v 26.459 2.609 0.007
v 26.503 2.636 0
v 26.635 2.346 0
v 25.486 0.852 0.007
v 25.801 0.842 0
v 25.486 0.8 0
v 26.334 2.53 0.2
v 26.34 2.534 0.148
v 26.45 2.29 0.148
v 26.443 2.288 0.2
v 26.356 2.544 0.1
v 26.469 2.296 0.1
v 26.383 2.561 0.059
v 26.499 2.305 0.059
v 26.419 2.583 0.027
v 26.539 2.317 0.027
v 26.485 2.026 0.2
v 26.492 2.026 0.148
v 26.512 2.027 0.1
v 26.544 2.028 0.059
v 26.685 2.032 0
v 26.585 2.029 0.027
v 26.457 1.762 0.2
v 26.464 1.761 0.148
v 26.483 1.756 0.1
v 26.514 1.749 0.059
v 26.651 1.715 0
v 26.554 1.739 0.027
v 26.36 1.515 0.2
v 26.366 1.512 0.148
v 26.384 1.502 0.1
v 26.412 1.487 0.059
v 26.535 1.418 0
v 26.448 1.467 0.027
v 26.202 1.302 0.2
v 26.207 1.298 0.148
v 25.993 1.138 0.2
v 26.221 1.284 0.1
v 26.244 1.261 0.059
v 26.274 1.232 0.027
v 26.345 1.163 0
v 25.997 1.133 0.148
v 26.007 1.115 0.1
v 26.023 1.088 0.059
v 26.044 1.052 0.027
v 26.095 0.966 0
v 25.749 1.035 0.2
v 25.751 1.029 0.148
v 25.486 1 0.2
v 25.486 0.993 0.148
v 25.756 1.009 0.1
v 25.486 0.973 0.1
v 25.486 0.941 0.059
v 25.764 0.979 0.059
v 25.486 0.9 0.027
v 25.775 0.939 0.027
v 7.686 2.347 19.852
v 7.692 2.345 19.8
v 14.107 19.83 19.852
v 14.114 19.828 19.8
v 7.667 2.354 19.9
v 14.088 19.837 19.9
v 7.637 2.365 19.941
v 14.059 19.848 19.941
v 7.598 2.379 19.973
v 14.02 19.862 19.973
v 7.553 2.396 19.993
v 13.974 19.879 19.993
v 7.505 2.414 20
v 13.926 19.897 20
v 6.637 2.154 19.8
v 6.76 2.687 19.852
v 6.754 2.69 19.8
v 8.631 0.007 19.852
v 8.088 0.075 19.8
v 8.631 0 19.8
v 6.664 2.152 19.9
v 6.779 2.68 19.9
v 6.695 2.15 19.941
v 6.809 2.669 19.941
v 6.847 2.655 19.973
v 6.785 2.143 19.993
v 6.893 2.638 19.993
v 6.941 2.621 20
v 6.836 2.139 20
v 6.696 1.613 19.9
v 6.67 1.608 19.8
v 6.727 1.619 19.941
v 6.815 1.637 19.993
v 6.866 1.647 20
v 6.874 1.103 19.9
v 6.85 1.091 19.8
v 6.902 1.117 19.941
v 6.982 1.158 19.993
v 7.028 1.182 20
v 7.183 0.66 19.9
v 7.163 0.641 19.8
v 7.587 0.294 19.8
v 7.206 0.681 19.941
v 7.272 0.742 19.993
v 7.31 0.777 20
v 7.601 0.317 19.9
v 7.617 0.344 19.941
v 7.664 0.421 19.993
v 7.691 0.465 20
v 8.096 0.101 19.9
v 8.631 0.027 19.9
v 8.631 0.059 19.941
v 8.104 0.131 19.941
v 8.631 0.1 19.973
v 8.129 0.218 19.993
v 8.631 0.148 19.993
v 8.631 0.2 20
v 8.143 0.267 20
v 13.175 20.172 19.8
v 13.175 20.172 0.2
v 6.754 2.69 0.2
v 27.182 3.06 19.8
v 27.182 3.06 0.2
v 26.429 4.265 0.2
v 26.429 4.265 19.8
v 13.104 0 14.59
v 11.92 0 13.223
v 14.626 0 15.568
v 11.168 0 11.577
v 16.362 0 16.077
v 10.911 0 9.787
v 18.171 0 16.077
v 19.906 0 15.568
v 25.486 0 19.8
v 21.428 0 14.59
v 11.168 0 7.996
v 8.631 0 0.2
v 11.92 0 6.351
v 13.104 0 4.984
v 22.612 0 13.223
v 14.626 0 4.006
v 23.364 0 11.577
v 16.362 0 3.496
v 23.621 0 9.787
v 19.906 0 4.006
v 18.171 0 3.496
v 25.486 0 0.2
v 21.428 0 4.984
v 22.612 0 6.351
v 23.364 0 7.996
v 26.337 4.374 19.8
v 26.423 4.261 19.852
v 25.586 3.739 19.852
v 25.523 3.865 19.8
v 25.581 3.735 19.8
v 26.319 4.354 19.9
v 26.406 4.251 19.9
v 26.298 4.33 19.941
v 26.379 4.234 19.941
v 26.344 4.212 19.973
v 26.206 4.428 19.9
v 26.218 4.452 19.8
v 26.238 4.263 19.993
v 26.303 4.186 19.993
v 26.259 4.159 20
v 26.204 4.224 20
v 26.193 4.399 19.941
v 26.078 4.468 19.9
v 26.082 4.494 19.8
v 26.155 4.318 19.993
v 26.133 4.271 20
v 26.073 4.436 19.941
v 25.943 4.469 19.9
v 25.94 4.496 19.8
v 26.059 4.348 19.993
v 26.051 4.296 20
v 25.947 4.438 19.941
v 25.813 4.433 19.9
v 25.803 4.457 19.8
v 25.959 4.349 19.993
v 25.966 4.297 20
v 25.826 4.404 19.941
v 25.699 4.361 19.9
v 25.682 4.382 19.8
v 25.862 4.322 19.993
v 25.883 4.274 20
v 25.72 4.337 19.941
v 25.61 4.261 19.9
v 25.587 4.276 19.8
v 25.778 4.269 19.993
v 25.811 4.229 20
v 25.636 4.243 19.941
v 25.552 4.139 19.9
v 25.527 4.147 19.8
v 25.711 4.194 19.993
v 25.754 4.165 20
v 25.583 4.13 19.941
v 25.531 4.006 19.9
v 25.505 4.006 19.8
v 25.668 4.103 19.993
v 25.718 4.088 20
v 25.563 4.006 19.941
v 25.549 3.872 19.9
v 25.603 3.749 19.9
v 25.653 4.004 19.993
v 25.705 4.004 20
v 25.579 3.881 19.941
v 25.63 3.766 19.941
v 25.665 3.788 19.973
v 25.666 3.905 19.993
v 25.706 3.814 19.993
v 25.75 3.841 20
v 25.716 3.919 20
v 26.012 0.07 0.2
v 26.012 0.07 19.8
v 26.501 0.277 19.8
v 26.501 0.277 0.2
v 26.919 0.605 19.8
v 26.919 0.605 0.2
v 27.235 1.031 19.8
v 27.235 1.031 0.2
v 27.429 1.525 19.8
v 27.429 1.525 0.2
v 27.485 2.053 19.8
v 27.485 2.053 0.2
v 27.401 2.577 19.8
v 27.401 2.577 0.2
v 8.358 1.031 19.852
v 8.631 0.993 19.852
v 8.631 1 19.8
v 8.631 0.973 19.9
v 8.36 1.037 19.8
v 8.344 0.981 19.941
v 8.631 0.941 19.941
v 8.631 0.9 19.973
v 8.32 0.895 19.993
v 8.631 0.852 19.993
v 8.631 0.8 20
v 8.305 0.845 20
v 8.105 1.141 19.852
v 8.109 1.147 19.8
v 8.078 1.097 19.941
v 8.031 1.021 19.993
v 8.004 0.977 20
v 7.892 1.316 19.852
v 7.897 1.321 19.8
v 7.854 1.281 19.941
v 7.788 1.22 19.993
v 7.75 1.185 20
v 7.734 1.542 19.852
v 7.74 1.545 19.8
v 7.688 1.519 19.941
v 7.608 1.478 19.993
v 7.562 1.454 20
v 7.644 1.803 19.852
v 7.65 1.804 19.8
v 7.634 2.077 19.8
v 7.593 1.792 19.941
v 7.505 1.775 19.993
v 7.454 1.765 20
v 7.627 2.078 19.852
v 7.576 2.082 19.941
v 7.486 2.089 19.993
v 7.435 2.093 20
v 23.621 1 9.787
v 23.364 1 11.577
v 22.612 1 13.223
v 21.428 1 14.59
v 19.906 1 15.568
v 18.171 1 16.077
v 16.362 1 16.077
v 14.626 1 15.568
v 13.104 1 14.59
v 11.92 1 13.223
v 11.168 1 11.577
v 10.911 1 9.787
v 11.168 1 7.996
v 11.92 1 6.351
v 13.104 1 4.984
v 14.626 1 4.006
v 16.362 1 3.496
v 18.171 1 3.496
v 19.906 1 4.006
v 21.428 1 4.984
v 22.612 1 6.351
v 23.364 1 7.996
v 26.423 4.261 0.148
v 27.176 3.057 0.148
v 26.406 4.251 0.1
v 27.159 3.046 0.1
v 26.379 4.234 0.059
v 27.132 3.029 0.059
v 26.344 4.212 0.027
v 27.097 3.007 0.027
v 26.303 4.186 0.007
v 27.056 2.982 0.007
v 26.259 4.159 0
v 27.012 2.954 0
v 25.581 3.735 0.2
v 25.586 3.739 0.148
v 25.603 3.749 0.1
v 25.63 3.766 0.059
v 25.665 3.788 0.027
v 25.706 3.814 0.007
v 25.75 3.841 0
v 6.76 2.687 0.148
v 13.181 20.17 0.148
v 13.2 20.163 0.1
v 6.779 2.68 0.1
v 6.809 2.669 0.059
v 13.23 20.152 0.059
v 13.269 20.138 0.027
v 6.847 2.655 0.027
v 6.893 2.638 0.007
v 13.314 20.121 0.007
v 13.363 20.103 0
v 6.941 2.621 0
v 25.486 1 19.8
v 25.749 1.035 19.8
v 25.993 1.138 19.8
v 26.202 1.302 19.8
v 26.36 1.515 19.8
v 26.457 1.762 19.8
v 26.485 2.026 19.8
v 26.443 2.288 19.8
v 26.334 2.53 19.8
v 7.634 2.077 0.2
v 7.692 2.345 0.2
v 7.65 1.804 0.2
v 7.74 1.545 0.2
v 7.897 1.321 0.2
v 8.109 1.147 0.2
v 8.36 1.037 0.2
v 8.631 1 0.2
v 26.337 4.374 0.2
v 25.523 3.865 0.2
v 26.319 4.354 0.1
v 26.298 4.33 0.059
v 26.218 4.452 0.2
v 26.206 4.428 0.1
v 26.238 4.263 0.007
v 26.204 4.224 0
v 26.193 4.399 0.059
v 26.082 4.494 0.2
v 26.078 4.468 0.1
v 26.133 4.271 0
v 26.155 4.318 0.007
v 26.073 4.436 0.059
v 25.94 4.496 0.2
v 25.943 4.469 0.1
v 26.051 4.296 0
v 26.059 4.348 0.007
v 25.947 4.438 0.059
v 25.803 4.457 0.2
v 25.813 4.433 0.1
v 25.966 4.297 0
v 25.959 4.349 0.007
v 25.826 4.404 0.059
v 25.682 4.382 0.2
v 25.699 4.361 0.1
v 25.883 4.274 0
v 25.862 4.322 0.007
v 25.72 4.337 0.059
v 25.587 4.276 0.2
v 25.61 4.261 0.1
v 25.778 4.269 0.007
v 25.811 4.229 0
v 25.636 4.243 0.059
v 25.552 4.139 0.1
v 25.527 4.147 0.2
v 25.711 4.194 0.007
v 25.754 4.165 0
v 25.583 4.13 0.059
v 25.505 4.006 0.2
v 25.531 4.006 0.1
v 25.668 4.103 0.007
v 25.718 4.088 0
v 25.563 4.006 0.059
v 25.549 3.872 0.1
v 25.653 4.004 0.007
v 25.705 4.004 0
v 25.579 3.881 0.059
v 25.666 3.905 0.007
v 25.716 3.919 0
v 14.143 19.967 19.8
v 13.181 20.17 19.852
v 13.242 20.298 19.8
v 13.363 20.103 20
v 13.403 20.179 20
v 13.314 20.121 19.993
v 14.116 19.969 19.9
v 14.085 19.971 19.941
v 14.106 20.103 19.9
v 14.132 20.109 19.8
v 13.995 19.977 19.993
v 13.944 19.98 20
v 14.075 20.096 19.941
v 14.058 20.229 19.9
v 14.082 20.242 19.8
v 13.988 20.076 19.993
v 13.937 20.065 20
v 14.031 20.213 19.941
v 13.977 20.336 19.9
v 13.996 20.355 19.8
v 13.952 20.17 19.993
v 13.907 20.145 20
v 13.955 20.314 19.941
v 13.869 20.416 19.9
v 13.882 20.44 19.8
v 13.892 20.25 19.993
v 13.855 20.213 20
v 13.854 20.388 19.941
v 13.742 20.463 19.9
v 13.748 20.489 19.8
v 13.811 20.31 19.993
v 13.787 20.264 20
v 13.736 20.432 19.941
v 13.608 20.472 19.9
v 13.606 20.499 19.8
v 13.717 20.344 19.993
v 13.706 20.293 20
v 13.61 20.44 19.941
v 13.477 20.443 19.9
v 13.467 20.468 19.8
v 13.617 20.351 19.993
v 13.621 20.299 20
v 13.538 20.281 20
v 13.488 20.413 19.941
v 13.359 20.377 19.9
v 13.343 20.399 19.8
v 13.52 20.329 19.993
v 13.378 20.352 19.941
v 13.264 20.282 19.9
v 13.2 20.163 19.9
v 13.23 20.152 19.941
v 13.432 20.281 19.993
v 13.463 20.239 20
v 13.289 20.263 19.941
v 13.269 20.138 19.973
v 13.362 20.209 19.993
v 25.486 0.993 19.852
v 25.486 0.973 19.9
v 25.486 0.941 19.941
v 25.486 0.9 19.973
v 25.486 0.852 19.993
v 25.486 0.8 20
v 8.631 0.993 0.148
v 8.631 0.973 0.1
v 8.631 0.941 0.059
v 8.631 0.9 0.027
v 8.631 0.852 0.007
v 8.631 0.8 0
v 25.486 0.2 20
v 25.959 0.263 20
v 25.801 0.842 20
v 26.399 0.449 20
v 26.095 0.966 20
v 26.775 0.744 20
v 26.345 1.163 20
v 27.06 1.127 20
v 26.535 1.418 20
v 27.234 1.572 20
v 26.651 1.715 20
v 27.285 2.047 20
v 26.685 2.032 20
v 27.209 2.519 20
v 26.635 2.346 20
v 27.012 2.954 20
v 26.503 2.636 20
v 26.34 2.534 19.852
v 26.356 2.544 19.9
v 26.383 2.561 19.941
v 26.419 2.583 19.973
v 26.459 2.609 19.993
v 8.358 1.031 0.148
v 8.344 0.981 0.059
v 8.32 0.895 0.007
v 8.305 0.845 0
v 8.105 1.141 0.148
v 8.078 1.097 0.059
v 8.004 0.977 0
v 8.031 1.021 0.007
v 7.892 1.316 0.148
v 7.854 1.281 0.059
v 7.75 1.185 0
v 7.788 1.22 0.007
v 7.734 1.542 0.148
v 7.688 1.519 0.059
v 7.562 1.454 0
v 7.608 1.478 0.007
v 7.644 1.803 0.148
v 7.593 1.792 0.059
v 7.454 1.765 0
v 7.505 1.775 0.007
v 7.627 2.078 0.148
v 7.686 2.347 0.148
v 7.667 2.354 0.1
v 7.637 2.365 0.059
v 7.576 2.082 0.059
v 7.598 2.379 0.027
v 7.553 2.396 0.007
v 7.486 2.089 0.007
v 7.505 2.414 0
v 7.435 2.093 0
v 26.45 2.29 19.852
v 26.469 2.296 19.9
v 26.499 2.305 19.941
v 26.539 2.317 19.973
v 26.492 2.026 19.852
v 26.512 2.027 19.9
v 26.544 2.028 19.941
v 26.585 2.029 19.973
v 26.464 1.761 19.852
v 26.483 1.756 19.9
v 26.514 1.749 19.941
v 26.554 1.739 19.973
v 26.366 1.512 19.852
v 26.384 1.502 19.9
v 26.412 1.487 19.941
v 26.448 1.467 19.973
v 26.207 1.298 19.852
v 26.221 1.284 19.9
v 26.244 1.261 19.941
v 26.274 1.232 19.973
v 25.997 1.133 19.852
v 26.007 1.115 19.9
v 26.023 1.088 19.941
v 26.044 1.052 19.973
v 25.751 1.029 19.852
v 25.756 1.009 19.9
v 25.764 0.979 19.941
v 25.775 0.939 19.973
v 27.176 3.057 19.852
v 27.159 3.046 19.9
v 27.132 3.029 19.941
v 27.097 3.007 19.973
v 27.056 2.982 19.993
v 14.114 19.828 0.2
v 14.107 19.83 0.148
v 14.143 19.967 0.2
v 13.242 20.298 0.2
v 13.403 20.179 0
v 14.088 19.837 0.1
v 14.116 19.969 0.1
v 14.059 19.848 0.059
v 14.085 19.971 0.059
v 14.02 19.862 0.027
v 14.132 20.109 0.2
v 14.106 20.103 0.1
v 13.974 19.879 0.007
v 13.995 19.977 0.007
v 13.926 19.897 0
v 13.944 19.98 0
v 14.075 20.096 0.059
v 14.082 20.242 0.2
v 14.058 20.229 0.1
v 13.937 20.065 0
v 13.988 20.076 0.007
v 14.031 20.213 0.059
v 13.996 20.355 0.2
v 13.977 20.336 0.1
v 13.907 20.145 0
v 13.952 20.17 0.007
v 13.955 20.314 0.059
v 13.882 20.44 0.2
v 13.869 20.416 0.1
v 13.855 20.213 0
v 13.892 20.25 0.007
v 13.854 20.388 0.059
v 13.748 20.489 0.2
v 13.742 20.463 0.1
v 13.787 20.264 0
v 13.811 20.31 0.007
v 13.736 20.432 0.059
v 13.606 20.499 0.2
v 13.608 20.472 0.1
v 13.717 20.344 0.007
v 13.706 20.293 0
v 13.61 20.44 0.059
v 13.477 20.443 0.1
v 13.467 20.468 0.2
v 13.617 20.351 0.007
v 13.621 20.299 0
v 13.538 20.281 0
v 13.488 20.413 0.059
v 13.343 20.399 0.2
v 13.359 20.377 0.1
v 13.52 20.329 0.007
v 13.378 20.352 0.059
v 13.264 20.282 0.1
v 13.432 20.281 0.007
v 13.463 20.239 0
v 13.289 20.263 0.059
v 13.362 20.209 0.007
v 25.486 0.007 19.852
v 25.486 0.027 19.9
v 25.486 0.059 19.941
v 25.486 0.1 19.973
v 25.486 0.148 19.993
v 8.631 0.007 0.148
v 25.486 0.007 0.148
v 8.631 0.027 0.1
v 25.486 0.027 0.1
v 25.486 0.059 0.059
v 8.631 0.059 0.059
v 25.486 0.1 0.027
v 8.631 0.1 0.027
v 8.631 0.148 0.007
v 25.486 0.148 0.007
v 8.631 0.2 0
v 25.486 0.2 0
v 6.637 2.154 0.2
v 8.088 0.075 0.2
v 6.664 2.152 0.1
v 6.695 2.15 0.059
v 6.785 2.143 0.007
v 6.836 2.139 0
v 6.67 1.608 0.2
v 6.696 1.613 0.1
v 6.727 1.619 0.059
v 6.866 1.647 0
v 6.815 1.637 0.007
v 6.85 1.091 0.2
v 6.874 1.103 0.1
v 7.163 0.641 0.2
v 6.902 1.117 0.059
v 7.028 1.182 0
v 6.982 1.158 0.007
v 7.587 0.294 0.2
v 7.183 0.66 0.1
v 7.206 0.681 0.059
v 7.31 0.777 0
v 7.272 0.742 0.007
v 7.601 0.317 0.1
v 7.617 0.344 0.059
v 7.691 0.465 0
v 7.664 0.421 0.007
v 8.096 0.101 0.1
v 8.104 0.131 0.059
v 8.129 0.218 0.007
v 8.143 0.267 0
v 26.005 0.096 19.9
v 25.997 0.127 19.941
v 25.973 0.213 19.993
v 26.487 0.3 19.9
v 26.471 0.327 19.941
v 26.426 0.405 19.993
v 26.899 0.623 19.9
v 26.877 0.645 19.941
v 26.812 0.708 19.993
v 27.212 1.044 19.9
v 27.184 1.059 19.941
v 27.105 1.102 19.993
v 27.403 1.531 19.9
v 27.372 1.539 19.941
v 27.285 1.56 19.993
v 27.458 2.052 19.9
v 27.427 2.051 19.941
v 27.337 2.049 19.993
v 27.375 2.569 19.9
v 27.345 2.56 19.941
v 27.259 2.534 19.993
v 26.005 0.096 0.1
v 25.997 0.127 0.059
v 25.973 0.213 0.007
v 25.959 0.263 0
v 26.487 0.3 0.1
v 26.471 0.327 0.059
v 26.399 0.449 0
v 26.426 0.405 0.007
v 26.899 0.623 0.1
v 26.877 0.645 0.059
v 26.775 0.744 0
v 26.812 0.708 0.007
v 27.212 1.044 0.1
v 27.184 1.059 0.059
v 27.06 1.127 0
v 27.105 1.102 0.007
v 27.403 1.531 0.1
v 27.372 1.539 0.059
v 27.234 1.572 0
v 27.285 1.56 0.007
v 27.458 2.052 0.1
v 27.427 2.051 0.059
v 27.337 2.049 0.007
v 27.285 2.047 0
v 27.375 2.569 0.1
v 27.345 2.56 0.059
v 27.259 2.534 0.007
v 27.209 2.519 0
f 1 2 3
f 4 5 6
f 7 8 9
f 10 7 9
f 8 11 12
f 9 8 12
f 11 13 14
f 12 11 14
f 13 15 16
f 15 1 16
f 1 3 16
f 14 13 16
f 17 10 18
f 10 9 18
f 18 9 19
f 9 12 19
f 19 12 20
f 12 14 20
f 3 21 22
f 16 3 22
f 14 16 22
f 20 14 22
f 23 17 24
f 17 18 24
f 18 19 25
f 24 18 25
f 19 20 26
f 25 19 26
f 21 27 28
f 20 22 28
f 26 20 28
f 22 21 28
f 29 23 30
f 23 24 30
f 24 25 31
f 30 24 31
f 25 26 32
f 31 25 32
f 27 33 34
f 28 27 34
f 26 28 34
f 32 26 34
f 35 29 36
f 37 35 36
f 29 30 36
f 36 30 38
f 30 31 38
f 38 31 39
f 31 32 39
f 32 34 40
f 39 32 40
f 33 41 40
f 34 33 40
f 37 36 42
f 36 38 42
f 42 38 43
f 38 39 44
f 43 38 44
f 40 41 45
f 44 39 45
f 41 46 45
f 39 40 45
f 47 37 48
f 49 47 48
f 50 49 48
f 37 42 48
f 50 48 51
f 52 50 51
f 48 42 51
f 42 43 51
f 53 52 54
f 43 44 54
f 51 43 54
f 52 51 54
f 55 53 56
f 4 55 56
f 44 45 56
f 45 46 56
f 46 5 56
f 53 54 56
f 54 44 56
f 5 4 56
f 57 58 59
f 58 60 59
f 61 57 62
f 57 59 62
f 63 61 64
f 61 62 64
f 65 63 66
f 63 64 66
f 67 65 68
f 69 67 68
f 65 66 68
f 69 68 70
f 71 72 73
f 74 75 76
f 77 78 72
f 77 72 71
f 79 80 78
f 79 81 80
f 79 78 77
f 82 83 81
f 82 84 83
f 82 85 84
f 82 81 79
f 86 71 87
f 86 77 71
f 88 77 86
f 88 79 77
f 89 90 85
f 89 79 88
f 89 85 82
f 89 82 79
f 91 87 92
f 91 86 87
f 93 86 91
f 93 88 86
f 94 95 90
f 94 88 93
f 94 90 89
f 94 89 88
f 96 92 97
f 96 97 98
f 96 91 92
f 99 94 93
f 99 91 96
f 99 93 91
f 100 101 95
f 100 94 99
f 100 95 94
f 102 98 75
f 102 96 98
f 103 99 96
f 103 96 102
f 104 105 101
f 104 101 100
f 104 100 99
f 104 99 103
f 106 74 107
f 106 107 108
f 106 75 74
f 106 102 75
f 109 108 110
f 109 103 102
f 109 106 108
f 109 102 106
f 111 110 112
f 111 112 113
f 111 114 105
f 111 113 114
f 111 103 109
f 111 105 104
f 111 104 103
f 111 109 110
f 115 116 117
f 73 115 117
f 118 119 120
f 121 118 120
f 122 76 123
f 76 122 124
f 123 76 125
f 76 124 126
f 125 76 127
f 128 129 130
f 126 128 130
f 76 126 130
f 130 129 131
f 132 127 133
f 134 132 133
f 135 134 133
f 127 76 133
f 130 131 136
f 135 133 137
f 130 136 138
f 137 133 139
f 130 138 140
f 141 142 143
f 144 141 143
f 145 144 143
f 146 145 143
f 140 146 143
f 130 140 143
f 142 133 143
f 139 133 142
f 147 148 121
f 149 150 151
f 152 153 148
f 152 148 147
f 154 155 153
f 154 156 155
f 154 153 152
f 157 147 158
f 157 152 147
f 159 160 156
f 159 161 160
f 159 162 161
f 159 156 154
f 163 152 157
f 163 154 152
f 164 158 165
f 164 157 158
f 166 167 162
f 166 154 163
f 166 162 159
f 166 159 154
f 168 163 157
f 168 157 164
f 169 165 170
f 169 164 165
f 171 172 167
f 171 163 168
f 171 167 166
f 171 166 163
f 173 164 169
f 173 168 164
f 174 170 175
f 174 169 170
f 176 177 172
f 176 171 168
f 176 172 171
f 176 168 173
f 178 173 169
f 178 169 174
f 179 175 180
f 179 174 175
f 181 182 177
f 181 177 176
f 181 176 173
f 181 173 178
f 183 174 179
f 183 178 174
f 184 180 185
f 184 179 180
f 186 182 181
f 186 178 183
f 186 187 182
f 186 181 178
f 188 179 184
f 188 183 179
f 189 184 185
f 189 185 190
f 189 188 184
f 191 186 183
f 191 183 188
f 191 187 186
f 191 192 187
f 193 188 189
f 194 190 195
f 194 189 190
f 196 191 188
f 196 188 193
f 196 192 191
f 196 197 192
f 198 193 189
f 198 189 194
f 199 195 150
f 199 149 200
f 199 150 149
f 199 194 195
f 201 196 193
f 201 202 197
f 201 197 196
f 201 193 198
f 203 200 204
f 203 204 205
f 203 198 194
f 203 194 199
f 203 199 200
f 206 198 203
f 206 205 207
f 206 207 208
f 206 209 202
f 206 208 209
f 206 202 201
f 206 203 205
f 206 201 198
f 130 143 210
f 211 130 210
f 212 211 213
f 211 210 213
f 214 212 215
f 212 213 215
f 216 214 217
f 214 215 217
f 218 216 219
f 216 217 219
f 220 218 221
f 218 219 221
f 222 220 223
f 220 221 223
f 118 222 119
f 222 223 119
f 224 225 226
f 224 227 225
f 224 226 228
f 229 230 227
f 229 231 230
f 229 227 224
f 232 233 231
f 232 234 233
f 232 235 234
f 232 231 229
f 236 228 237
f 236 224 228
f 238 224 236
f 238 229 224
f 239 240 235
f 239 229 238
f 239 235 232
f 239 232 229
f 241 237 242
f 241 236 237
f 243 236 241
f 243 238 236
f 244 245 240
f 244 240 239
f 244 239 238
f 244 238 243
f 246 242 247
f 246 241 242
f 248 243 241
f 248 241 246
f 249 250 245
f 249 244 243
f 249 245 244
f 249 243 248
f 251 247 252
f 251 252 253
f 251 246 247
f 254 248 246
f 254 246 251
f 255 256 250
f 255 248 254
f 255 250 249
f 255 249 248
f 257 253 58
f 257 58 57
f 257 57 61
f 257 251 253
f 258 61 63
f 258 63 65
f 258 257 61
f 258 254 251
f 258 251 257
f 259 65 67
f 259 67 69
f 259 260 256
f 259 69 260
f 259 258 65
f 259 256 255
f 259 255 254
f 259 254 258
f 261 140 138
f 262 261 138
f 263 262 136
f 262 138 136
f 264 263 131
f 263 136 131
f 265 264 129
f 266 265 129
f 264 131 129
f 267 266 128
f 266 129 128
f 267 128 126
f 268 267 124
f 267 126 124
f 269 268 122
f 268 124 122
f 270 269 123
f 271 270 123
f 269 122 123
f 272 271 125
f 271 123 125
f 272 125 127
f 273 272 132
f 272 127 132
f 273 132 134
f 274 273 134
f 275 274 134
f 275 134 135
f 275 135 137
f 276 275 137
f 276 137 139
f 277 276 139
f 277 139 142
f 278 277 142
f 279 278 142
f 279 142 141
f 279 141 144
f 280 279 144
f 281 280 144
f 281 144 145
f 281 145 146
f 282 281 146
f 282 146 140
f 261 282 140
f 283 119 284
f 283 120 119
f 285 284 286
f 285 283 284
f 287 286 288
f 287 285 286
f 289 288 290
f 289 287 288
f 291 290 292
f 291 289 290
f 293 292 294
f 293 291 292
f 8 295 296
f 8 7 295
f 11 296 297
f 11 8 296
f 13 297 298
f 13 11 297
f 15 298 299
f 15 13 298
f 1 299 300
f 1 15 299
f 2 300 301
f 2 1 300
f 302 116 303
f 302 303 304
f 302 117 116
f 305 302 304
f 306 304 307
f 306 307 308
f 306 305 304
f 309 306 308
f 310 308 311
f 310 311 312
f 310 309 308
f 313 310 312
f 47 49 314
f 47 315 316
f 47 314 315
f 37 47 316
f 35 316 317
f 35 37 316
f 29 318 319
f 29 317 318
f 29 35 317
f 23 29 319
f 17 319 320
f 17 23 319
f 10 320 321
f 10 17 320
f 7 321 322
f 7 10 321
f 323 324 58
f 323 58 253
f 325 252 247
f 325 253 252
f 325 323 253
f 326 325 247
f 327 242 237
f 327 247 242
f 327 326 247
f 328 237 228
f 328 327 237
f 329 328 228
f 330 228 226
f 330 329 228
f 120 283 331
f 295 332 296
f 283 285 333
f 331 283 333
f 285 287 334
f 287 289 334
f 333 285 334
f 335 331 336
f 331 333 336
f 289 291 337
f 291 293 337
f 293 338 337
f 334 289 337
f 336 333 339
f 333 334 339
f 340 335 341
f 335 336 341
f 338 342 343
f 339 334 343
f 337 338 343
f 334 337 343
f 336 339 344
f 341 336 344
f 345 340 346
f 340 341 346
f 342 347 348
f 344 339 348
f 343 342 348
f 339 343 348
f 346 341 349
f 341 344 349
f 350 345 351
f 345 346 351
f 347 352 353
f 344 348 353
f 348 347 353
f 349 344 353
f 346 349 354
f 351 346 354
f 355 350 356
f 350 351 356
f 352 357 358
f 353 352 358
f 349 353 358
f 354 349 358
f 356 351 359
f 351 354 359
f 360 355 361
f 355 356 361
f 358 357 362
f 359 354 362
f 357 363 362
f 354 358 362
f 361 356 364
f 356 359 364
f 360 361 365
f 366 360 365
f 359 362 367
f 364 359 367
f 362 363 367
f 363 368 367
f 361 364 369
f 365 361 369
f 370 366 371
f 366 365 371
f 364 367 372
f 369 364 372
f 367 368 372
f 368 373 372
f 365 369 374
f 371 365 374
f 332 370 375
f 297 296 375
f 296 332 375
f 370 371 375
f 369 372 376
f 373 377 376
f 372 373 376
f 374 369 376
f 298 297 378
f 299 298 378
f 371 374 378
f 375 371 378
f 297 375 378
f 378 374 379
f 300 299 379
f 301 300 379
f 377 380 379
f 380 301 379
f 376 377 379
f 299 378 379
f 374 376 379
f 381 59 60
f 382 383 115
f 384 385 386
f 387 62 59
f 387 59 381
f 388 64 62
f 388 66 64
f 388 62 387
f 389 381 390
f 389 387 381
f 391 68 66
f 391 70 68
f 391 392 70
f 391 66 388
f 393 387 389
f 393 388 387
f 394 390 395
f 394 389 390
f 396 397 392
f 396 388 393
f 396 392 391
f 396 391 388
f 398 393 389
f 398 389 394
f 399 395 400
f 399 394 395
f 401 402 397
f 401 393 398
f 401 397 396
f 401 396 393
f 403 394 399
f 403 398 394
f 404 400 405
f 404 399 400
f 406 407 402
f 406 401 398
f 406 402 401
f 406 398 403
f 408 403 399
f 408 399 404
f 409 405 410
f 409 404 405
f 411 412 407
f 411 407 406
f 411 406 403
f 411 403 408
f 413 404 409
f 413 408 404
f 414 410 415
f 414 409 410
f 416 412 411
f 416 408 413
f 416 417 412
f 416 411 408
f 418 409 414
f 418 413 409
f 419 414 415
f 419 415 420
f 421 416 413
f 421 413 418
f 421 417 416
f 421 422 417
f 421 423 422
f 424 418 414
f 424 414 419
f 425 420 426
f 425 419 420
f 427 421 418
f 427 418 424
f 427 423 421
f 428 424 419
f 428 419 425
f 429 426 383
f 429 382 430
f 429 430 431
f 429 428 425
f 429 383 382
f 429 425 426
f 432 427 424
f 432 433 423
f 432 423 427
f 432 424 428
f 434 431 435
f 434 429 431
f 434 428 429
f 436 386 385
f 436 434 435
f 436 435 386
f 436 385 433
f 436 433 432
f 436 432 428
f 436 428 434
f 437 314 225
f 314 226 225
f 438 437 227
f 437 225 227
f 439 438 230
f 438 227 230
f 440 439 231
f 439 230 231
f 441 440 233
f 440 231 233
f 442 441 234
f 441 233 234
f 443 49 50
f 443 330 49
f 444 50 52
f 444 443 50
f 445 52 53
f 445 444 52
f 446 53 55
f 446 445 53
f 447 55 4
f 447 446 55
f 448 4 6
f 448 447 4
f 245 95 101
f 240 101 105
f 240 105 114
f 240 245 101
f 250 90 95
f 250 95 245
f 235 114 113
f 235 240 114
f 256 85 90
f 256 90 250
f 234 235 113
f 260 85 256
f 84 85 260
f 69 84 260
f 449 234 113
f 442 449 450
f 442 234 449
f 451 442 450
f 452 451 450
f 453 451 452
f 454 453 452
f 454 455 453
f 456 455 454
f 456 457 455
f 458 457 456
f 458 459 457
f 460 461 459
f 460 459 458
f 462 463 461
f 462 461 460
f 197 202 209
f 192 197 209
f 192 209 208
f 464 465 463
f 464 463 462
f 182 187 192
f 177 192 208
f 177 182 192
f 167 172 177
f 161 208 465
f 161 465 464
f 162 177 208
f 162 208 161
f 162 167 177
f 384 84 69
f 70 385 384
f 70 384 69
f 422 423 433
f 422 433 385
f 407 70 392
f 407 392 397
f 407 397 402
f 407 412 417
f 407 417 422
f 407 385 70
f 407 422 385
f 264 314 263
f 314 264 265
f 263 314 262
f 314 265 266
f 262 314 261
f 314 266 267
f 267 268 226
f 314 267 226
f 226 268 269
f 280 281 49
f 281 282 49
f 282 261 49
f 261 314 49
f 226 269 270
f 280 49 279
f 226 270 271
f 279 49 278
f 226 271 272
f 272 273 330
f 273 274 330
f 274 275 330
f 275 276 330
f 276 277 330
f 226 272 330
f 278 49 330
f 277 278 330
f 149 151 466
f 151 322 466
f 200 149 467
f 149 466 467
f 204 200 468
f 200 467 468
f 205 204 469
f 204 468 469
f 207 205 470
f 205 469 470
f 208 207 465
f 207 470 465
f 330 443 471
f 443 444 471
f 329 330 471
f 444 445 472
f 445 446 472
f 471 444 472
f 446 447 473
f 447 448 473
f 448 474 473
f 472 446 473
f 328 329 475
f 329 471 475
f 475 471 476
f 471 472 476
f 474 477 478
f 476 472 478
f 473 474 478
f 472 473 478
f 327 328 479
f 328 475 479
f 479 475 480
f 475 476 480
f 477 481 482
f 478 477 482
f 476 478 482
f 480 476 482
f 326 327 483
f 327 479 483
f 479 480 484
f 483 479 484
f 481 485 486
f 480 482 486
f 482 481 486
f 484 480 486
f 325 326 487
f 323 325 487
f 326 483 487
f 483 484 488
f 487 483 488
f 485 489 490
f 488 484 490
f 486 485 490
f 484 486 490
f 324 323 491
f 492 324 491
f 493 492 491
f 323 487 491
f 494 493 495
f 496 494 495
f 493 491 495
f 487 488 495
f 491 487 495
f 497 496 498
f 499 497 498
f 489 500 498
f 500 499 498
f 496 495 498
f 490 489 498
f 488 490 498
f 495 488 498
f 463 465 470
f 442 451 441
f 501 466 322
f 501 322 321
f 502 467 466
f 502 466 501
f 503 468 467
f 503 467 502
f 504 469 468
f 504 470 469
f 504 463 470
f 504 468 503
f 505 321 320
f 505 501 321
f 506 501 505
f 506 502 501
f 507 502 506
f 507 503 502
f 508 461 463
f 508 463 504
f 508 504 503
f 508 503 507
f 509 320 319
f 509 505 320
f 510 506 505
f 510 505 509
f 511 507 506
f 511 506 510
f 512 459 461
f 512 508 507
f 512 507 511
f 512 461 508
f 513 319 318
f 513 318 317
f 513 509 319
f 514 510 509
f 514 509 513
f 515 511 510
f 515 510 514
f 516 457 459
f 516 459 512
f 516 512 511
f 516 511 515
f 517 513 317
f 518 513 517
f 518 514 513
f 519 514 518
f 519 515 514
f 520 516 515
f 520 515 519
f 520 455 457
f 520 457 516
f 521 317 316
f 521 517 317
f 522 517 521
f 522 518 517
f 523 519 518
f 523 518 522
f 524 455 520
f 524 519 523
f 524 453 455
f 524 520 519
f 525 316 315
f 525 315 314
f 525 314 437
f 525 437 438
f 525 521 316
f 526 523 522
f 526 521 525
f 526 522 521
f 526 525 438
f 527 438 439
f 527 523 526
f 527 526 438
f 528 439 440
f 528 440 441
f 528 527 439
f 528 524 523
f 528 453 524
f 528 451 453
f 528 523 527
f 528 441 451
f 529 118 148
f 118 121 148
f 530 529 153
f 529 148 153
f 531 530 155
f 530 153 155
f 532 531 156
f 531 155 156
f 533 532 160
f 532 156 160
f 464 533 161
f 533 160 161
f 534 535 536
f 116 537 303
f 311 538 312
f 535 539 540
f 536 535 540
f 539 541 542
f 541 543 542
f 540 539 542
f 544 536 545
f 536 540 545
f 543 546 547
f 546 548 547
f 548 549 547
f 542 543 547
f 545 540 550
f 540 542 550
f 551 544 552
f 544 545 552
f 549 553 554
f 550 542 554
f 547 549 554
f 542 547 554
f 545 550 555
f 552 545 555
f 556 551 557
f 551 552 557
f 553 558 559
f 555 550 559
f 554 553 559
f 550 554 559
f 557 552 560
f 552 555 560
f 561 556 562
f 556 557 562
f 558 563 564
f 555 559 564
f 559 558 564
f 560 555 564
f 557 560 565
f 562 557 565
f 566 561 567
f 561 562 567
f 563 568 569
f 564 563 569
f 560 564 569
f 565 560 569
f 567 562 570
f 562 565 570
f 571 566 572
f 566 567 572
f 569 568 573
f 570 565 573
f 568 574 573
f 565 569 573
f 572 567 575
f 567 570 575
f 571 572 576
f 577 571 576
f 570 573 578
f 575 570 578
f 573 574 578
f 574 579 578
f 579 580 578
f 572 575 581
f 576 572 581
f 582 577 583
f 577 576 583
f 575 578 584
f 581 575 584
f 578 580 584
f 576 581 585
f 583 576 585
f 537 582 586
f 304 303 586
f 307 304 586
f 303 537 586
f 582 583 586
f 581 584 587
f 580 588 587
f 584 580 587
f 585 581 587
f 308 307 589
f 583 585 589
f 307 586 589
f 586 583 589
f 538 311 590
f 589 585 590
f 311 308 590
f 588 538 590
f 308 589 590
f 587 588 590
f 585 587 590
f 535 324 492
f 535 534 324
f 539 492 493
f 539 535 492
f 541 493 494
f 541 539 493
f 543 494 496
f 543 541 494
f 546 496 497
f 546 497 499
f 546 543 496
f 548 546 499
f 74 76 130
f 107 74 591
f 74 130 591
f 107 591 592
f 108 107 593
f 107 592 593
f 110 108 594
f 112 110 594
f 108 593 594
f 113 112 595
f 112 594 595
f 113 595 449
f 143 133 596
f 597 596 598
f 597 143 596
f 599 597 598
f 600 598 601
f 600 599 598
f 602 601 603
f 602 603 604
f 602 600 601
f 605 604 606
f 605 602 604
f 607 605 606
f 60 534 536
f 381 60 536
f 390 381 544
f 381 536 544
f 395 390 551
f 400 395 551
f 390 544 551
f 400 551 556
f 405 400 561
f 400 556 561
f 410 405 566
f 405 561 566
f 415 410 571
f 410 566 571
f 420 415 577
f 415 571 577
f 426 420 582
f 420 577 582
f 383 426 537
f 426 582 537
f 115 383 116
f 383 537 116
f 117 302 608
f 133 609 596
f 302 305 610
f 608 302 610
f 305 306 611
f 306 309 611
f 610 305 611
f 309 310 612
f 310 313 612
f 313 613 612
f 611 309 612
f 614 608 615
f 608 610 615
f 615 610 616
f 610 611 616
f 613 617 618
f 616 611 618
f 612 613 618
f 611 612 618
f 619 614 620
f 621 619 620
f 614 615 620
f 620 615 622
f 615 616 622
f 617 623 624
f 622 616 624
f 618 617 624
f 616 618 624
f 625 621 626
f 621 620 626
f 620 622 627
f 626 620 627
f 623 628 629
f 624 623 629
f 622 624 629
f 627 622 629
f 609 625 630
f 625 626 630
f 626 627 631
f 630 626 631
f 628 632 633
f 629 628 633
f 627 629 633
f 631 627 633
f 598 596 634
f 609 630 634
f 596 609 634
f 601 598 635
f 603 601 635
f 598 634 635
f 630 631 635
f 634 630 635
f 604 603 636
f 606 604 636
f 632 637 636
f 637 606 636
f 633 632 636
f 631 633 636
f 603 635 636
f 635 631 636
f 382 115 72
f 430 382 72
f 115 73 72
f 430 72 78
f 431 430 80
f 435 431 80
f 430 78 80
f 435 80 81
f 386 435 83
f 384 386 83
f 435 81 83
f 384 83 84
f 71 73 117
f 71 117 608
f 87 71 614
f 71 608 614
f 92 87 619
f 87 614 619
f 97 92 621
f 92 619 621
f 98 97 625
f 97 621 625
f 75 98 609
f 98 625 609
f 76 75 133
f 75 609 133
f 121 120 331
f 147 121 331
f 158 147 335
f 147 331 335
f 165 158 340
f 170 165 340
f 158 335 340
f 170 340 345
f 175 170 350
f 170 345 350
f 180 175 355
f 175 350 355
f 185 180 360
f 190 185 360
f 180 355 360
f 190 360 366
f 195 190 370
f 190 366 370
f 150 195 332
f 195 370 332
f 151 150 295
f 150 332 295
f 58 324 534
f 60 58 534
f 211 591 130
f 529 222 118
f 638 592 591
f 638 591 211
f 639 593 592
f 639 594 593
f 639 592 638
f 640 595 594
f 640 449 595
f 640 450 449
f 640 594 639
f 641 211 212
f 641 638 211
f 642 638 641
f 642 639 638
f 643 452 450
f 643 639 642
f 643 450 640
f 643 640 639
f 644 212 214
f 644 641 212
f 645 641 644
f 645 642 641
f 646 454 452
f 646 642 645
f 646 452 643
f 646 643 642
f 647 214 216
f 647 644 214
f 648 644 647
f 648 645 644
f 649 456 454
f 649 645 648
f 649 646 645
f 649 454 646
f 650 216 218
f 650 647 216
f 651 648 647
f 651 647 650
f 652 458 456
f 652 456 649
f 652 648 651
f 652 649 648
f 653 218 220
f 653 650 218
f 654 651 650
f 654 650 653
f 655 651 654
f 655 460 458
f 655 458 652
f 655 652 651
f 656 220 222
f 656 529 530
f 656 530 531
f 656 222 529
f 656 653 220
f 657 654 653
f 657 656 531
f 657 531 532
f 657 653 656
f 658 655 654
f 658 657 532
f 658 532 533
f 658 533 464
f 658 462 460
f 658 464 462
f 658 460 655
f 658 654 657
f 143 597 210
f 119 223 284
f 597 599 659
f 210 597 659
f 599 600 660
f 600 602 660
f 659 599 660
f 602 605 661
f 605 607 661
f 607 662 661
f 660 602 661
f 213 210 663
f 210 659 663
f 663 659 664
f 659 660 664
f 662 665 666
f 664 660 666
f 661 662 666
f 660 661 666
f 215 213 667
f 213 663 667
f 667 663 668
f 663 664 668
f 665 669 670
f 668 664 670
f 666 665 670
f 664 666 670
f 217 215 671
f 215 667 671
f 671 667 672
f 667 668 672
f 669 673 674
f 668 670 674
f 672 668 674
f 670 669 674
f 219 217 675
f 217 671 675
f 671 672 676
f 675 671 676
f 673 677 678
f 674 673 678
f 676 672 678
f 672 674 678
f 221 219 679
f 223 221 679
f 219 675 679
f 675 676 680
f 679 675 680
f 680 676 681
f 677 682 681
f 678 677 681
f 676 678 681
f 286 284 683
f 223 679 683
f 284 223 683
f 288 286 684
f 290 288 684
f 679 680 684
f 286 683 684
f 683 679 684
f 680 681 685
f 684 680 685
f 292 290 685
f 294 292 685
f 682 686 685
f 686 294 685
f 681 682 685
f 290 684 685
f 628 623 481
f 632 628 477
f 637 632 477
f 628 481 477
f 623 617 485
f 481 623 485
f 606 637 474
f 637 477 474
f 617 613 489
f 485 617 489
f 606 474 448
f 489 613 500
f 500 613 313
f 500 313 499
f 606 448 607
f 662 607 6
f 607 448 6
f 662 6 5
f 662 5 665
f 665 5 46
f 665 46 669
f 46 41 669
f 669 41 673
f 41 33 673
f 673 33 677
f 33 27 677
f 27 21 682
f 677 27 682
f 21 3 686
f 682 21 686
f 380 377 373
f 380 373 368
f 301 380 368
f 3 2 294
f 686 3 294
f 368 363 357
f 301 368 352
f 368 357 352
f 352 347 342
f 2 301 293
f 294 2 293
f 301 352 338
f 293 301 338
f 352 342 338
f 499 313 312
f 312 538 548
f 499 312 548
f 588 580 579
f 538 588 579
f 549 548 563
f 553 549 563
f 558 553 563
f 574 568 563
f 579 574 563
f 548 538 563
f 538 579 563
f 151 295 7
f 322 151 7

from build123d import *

# Parameters (mm, degrees)
PAD_DEPTH    = 20
FILLET_R     = 0.2
SKETCH001_R  = 6.35529
POCKET_DEPTH = 5


with BuildPart() as part:
    # Sketch → Pad (new body)
    with BuildSketch(Plane.XY):
        with BuildLine():
            Line((13.174844, 20.172385), (6.753583, 2.689539))
            ThreePointArc((6.753583, 2.689539), (6.990976, 0.855246), (8.630958, 0))
            Line((8.630958, 0), (25.485807, 0))
            ThreePointArc((25.485807, 0), (27.23513, 1.030532), (27.18172, 3.060131))
            Line((27.18172, 3.060131), (26.428525, 4.265033))
            ThreePointArc((26.428525, 4.265033), (25.739514, 4.423978), (25.580568, 3.734967))
            Line((25.580568, 3.734967), (26.333764, 2.530066))
            ThreePointArc((25.485807, 1), (26.360469, 1.515266), (26.333764, 2.530066))
            Line((25.485807, 1), (8.630958, 1))
            ThreePointArc((7.69227, 2.34477), (7.810967, 1.427623), (8.630958, 1))
            Line((7.69227, 2.34477), (14.113531, 19.827615))
            ThreePointArc((14.113531, 19.827615), (13.816572, 20.469344), (13.174844, 20.172385))
        make_face()
    extrude(amount=PAD_DEPTH)

    # Fillet
    fillet_edges = [part.edges().sort_by_distance(p)[0] for p in [
        (10.902901, 11.086192, 20),
        (13.816572, 20.469344, 20),
        (9.964213, 11.430962, 20),
        (6.990976, 0.855246, 20),
        (17.058382, 0, 20),
        (27.23513, 1.030532, 20),
        (26.805123, 3.662582, 20),
        (25.739514, 4.423978, 20),
        (25.957166, 3.132516, 20),
        (26.360469, 1.515266, 20),
        (17.058382, 1, 20),
        (7.810967, 1.427623, 20),
        (10.902901, 11.086192, 0),
        (13.816572, 20.469344, 0),
        (9.964213, 11.430962, 0),
        (6.990976, 0.855246, 0),
        (17.058382, 0, 0),
        (27.23513, 1.030532, 0),
        (26.805123, 3.662582, 0),
        (25.739514, 4.423978, 0),
        (25.957166, 3.132516, 0),
        (26.360469, 1.515266, 0),
        (17.058382, 1, 0),
        (7.810967, 1.427623, 0),
    ]]
    fillet(fillet_edges, radius=FILLET_R)

    # Sketch001 (on Face35 of Fillet) → Pocket (cut)
    with BuildSketch(Plane.XZ):
        with Locations((17.266081, 9.78687)):
            Circle(SKETCH001_R)
    extrude(amount=-POCKET_DEPTH, mode=Mode.SUBTRACT)


solid = part.part
